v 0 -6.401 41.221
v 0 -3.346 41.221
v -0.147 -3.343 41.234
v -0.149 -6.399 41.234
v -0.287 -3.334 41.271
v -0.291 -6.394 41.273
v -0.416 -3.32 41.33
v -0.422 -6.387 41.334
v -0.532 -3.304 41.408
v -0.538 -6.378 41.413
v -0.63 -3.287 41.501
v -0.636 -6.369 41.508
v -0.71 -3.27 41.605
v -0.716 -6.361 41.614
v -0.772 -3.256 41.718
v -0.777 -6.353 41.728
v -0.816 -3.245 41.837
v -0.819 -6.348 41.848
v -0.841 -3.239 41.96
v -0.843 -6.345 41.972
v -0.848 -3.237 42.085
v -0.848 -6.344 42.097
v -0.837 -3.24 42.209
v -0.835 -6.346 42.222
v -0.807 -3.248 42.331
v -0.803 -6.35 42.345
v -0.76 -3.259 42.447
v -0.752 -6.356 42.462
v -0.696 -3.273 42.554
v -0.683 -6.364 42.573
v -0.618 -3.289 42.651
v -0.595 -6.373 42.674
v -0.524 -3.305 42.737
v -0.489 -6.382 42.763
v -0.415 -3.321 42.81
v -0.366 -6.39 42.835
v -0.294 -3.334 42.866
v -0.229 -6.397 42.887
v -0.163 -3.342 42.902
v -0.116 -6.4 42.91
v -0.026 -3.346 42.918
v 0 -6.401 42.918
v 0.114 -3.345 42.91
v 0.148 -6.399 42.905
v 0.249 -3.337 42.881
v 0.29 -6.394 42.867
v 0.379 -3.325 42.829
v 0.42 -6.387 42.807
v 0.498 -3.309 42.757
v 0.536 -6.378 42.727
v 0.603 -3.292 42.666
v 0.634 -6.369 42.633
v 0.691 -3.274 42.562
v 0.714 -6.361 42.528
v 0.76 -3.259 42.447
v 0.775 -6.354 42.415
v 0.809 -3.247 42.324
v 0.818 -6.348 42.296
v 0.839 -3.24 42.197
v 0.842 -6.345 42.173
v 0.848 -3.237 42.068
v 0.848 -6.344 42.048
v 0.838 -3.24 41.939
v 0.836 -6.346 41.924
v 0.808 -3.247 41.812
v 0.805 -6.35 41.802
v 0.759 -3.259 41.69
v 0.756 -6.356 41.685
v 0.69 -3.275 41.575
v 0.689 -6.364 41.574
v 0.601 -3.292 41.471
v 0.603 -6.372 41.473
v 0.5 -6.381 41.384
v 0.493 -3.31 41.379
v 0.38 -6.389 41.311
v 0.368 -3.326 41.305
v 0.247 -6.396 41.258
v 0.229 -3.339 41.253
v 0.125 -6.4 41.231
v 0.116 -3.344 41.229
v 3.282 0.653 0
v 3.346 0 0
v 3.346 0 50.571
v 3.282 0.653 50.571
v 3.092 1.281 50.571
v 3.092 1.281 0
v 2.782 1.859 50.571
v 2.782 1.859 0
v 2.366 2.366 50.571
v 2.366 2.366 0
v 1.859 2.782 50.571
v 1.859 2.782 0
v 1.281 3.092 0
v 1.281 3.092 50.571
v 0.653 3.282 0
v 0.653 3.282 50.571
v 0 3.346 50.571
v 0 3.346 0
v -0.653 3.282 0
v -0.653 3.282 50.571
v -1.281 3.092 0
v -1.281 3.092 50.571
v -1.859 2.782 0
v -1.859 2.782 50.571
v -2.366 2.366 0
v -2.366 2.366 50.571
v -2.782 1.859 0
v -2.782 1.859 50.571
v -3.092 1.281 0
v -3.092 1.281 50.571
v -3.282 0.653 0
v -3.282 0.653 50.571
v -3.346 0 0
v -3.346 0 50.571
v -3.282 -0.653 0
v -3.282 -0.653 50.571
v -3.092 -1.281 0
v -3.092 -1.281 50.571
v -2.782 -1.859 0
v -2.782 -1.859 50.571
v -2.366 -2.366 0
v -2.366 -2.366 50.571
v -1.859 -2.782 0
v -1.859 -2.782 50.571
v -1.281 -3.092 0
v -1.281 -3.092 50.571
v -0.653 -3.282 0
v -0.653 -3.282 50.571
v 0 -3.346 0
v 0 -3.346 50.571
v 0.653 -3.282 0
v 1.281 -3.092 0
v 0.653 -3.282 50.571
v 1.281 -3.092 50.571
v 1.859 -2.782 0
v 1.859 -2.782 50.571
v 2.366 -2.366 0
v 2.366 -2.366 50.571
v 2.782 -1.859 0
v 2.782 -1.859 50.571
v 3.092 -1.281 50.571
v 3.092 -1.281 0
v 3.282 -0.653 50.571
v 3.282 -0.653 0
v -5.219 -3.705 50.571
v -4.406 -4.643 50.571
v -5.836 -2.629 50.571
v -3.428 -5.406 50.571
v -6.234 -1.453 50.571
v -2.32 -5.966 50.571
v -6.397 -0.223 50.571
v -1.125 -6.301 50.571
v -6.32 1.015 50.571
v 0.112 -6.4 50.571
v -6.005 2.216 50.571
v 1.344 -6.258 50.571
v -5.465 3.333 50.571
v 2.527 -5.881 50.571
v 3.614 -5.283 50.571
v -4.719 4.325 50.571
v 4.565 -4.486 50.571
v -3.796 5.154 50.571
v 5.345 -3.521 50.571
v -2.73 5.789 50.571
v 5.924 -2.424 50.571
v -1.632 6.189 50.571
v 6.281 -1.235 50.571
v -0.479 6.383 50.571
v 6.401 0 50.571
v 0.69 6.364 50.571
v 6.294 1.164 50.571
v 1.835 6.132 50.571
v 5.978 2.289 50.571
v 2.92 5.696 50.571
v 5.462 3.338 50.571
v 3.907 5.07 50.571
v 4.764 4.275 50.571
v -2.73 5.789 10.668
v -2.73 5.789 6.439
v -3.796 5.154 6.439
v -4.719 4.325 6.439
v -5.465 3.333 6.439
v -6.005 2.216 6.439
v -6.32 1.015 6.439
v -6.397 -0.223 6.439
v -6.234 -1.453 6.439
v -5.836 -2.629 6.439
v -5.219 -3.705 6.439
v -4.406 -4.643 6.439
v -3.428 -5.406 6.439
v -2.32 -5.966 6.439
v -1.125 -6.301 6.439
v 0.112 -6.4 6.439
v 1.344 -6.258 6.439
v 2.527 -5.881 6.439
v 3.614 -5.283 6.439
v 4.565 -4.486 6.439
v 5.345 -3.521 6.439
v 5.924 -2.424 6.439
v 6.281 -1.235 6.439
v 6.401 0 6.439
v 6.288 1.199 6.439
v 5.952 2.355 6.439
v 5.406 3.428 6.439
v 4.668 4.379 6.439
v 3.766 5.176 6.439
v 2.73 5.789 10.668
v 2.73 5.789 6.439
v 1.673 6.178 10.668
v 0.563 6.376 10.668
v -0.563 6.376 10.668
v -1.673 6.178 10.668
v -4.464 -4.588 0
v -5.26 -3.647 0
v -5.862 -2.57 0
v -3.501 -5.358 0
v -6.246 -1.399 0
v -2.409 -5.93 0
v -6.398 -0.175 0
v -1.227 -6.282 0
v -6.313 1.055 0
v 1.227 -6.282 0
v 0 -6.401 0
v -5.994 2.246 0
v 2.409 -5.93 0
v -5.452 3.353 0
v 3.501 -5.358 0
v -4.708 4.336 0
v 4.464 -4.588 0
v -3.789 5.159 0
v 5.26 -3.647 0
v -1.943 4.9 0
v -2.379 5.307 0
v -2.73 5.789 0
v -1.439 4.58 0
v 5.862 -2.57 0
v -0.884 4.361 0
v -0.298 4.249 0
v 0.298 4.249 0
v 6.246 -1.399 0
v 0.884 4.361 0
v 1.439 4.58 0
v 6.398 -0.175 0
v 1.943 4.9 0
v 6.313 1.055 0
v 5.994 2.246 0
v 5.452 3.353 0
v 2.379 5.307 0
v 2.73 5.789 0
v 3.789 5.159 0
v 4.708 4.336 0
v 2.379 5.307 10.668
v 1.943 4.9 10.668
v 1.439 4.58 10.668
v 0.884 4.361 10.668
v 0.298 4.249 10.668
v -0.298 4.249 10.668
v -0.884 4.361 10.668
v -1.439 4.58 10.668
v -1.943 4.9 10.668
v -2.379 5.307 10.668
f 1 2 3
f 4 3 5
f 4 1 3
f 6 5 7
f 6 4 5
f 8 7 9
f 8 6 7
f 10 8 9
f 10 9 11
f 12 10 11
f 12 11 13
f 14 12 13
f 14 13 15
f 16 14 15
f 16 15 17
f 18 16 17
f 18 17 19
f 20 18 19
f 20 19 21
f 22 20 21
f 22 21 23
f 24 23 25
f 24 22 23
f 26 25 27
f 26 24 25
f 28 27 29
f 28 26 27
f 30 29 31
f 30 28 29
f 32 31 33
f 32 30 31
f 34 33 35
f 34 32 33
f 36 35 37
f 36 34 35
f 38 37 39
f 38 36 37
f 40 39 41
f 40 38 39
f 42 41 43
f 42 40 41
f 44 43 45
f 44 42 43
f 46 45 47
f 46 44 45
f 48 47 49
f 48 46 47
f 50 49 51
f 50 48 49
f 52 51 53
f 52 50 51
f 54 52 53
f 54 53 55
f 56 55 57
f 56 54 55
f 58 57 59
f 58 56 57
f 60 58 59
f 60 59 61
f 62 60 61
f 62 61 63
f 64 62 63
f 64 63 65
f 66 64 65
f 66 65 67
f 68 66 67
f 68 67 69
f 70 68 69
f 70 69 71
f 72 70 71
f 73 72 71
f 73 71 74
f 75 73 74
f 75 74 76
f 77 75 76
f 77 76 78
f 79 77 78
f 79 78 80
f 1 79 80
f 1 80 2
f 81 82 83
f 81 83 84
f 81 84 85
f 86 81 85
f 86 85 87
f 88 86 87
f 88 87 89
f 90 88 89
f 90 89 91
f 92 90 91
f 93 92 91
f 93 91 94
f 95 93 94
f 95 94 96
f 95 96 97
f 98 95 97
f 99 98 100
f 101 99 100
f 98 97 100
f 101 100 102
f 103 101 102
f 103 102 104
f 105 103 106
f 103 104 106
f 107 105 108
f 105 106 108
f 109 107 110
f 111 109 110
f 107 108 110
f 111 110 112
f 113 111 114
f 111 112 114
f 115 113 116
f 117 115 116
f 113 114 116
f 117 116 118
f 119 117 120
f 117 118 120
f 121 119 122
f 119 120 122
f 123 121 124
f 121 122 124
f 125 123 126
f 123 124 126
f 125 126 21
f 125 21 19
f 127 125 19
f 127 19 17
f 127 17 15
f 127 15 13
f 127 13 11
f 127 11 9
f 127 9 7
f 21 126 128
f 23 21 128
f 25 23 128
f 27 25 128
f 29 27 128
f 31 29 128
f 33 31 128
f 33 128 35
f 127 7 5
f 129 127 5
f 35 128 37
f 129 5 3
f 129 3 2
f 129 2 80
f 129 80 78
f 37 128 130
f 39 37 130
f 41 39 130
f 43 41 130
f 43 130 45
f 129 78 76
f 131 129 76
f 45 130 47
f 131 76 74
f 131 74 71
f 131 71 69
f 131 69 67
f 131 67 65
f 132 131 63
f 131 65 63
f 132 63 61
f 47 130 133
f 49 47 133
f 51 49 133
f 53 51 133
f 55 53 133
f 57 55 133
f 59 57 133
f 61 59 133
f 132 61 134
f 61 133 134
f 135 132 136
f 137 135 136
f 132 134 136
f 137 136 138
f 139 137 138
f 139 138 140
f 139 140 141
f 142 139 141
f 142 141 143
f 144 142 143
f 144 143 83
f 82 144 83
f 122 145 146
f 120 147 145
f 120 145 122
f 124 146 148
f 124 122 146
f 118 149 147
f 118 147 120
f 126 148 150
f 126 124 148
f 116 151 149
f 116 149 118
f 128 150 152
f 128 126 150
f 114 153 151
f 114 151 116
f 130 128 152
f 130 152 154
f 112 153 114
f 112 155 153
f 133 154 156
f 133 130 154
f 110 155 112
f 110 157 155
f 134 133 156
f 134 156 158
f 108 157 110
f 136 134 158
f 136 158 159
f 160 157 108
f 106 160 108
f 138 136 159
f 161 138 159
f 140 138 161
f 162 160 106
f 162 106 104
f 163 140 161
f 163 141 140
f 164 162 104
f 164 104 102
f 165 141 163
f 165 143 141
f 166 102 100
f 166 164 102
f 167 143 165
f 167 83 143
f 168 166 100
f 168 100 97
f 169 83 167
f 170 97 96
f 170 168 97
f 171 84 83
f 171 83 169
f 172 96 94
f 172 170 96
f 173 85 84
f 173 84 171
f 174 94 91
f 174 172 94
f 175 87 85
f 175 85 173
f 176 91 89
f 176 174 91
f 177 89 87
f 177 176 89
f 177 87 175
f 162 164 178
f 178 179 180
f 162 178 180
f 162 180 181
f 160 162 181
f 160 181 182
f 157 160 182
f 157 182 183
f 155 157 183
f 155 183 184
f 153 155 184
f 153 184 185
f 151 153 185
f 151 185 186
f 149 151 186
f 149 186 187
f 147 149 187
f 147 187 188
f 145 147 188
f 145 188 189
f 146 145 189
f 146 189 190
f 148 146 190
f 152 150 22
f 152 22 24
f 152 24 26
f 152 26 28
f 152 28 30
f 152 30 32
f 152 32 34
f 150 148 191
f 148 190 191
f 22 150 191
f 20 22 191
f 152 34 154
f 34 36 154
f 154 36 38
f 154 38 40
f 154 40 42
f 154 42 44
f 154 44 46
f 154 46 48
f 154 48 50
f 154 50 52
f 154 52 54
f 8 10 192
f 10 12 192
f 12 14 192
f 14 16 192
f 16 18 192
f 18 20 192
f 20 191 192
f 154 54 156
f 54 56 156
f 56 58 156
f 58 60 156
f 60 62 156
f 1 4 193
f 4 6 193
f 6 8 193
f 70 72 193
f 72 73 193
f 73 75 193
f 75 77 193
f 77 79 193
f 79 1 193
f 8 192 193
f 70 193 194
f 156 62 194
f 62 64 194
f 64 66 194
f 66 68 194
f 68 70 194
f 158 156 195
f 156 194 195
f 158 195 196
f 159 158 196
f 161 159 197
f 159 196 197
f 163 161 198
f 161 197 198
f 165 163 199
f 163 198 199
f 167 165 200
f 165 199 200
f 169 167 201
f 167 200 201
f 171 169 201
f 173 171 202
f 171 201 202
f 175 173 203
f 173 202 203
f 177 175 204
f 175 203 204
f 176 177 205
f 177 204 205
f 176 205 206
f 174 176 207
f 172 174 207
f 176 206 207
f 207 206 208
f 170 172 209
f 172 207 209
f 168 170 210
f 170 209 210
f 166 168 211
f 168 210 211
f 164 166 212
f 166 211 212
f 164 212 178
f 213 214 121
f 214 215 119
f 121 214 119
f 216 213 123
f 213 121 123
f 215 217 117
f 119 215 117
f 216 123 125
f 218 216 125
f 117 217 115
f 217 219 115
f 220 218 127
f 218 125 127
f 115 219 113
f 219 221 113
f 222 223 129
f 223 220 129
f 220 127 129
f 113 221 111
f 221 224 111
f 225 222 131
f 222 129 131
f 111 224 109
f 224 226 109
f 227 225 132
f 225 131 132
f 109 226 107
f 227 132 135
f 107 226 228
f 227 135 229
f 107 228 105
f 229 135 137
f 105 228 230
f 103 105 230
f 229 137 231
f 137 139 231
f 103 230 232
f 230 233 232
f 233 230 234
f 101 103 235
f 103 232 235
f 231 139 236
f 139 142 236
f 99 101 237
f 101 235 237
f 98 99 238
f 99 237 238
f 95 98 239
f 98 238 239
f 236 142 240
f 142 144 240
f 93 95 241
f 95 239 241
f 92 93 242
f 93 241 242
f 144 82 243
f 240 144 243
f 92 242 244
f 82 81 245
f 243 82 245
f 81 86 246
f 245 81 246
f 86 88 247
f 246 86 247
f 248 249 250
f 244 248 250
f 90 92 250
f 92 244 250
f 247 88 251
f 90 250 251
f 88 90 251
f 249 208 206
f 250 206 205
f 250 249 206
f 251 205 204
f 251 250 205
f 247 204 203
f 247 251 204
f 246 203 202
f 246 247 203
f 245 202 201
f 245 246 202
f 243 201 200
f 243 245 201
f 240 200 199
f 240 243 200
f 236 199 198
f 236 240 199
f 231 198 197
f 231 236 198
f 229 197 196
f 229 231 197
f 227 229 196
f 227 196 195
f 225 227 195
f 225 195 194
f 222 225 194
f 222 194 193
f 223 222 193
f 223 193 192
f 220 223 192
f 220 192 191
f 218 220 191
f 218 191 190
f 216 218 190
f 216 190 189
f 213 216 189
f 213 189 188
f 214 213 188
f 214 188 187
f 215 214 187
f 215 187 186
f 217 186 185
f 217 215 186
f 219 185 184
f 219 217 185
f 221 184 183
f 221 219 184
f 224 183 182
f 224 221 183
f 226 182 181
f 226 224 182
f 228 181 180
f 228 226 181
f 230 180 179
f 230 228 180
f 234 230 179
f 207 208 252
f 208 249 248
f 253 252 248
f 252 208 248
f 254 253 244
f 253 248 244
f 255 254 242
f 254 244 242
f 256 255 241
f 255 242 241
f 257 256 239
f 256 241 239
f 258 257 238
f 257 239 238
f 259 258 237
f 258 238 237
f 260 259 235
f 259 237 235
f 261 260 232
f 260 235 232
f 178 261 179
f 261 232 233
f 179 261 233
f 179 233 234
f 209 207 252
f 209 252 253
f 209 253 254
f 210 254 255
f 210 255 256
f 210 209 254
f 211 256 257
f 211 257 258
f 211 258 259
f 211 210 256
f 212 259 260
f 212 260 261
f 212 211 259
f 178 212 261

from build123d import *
from build123d.topology import SkipClean

# Parameters (mm, degrees)
SKETCH1_R           = 12.5349
BOSS_EXTRUDE1_DEPTH = 6.4389
BOSS_EXTRUDE2_DEPTH = 4.0386
SKETCH3_R           = 6.4008
BOSS_EXTRUDE3_DEPTH = 44.1325
SKETCH4_R           = 3.175
CUT_EXTRUDE1_DEPTH  = 10.668
CUT_EXTRUDE2_DEPTH  = 51.5714
SKETCH6_R           = 3.34645
CUT_EXTRUDE3_DEPTH  = 51.5714
SKETCH7_R           = 12.5349
SKETCH7_R_2         = 6.4008
CUT_EXTRUDE4_DEPTH  = 51.5714
SKETCH11_R          = 0.848438372
CUT_EXTRUDE5_DEPTH  = 5.08


with BuildPart() as part:
    # Sketch1 → Boss-Extrude1 (new body)
    with BuildSketch(Plane.XY):
        Circle(SKETCH1_R)
    extrude(amount=BOSS_EXTRUDE1_DEPTH)

    # Sketch2 → Boss-Extrude2 (add)
    with BuildSketch(Plane.XY.offset(6.4389)):
        with BuildLine():
            Line((-9.8298, 7.778094238), (9.8298, 7.778094238))
            ThreePointArc((9.8298, 7.778094238), (0, 12.5349), (-9.8298, 7.778094238))
        make_face()
    extrude(amount=BOSS_EXTRUDE2_DEPTH)

    # Sketch3 → Boss-Extrude3 (add)
    with BuildSketch(Plane.XY.offset(6.4389)):
        Circle(SKETCH3_R)
    extrude(amount=BOSS_EXTRUDE3_DEPTH)

    # Sketch4 → Cut-Extrude1 (cut)
    with BuildSketch(Plane(origin=(0, 0, 0), x_dir=(-1, 0, 0), z_dir=(0, 0, -1))):
        with Locations((0, 7.41045)):
            Circle(SKETCH4_R)
    extrude(amount=-CUT_EXTRUDE1_DEPTH, mode=Mode.SUBTRACT)

    # Sketch5 → Cut-Extrude2 (cut, through all)
    with BuildSketch(Plane(origin=(0, 0, 0), x_dir=(-1, 0, 0), z_dir=(0, 0, -1))):
        with BuildLine():
            Line((2.667, -12.247890798), (-2.667, -12.247890798))
            ThreePointArc((-2.667, -12.247890798), (0, -12.5349), (2.667, -12.247890798))
        make_face()
    extrude(amount=-CUT_EXTRUDE2_DEPTH, mode=Mode.SUBTRACT)

    # Sketch6 → Cut-Extrude3 (cut, through all)
    with BuildSketch(Plane.XY.offset(50.5714)):
        Circle(SKETCH6_R)
    extrude(amount=-CUT_EXTRUDE3_DEPTH, mode=Mode.SUBTRACT)

    # Sketch7 → Cut-Extrude4 (cut, through all)
    with SkipClean():  # keep this step's faces unmerged: merging them makes the solid invalid here
        with BuildSketch(Plane(origin=(0, 0, 0), x_dir=(-1, 0, 0), z_dir=(0, 0, -1))):
            Circle(SKETCH7_R)
            with Locations(Location((0, 0, 0), (0, 0, 64.753808508))):  # turned: the seam where the file's is
                Circle(SKETCH7_R_2, mode=Mode.SUBTRACT)
        extrude(amount=-CUT_EXTRUDE4_DEPTH, mode=Mode.SUBTRACT)

    # Sketch11 → Cut-Extrude5 (cut)
    with SkipClean():  # keep this step's faces unmerged: merging them makes the solid invalid here
        with BuildSketch(Plane(origin=(0, -6.4008, 0), x_dir=(-1, 0, 0), z_dir=(0, 1, 0))):
            with Locations(Location((0, 42.069683216, 0), (0, 0, 270))):  # turned: the seam where the file's is
                Circle(SKETCH11_R)
        extrude(amount=CUT_EXTRUDE5_DEPTH, mode=Mode.SUBTRACT)


solid = part.part
